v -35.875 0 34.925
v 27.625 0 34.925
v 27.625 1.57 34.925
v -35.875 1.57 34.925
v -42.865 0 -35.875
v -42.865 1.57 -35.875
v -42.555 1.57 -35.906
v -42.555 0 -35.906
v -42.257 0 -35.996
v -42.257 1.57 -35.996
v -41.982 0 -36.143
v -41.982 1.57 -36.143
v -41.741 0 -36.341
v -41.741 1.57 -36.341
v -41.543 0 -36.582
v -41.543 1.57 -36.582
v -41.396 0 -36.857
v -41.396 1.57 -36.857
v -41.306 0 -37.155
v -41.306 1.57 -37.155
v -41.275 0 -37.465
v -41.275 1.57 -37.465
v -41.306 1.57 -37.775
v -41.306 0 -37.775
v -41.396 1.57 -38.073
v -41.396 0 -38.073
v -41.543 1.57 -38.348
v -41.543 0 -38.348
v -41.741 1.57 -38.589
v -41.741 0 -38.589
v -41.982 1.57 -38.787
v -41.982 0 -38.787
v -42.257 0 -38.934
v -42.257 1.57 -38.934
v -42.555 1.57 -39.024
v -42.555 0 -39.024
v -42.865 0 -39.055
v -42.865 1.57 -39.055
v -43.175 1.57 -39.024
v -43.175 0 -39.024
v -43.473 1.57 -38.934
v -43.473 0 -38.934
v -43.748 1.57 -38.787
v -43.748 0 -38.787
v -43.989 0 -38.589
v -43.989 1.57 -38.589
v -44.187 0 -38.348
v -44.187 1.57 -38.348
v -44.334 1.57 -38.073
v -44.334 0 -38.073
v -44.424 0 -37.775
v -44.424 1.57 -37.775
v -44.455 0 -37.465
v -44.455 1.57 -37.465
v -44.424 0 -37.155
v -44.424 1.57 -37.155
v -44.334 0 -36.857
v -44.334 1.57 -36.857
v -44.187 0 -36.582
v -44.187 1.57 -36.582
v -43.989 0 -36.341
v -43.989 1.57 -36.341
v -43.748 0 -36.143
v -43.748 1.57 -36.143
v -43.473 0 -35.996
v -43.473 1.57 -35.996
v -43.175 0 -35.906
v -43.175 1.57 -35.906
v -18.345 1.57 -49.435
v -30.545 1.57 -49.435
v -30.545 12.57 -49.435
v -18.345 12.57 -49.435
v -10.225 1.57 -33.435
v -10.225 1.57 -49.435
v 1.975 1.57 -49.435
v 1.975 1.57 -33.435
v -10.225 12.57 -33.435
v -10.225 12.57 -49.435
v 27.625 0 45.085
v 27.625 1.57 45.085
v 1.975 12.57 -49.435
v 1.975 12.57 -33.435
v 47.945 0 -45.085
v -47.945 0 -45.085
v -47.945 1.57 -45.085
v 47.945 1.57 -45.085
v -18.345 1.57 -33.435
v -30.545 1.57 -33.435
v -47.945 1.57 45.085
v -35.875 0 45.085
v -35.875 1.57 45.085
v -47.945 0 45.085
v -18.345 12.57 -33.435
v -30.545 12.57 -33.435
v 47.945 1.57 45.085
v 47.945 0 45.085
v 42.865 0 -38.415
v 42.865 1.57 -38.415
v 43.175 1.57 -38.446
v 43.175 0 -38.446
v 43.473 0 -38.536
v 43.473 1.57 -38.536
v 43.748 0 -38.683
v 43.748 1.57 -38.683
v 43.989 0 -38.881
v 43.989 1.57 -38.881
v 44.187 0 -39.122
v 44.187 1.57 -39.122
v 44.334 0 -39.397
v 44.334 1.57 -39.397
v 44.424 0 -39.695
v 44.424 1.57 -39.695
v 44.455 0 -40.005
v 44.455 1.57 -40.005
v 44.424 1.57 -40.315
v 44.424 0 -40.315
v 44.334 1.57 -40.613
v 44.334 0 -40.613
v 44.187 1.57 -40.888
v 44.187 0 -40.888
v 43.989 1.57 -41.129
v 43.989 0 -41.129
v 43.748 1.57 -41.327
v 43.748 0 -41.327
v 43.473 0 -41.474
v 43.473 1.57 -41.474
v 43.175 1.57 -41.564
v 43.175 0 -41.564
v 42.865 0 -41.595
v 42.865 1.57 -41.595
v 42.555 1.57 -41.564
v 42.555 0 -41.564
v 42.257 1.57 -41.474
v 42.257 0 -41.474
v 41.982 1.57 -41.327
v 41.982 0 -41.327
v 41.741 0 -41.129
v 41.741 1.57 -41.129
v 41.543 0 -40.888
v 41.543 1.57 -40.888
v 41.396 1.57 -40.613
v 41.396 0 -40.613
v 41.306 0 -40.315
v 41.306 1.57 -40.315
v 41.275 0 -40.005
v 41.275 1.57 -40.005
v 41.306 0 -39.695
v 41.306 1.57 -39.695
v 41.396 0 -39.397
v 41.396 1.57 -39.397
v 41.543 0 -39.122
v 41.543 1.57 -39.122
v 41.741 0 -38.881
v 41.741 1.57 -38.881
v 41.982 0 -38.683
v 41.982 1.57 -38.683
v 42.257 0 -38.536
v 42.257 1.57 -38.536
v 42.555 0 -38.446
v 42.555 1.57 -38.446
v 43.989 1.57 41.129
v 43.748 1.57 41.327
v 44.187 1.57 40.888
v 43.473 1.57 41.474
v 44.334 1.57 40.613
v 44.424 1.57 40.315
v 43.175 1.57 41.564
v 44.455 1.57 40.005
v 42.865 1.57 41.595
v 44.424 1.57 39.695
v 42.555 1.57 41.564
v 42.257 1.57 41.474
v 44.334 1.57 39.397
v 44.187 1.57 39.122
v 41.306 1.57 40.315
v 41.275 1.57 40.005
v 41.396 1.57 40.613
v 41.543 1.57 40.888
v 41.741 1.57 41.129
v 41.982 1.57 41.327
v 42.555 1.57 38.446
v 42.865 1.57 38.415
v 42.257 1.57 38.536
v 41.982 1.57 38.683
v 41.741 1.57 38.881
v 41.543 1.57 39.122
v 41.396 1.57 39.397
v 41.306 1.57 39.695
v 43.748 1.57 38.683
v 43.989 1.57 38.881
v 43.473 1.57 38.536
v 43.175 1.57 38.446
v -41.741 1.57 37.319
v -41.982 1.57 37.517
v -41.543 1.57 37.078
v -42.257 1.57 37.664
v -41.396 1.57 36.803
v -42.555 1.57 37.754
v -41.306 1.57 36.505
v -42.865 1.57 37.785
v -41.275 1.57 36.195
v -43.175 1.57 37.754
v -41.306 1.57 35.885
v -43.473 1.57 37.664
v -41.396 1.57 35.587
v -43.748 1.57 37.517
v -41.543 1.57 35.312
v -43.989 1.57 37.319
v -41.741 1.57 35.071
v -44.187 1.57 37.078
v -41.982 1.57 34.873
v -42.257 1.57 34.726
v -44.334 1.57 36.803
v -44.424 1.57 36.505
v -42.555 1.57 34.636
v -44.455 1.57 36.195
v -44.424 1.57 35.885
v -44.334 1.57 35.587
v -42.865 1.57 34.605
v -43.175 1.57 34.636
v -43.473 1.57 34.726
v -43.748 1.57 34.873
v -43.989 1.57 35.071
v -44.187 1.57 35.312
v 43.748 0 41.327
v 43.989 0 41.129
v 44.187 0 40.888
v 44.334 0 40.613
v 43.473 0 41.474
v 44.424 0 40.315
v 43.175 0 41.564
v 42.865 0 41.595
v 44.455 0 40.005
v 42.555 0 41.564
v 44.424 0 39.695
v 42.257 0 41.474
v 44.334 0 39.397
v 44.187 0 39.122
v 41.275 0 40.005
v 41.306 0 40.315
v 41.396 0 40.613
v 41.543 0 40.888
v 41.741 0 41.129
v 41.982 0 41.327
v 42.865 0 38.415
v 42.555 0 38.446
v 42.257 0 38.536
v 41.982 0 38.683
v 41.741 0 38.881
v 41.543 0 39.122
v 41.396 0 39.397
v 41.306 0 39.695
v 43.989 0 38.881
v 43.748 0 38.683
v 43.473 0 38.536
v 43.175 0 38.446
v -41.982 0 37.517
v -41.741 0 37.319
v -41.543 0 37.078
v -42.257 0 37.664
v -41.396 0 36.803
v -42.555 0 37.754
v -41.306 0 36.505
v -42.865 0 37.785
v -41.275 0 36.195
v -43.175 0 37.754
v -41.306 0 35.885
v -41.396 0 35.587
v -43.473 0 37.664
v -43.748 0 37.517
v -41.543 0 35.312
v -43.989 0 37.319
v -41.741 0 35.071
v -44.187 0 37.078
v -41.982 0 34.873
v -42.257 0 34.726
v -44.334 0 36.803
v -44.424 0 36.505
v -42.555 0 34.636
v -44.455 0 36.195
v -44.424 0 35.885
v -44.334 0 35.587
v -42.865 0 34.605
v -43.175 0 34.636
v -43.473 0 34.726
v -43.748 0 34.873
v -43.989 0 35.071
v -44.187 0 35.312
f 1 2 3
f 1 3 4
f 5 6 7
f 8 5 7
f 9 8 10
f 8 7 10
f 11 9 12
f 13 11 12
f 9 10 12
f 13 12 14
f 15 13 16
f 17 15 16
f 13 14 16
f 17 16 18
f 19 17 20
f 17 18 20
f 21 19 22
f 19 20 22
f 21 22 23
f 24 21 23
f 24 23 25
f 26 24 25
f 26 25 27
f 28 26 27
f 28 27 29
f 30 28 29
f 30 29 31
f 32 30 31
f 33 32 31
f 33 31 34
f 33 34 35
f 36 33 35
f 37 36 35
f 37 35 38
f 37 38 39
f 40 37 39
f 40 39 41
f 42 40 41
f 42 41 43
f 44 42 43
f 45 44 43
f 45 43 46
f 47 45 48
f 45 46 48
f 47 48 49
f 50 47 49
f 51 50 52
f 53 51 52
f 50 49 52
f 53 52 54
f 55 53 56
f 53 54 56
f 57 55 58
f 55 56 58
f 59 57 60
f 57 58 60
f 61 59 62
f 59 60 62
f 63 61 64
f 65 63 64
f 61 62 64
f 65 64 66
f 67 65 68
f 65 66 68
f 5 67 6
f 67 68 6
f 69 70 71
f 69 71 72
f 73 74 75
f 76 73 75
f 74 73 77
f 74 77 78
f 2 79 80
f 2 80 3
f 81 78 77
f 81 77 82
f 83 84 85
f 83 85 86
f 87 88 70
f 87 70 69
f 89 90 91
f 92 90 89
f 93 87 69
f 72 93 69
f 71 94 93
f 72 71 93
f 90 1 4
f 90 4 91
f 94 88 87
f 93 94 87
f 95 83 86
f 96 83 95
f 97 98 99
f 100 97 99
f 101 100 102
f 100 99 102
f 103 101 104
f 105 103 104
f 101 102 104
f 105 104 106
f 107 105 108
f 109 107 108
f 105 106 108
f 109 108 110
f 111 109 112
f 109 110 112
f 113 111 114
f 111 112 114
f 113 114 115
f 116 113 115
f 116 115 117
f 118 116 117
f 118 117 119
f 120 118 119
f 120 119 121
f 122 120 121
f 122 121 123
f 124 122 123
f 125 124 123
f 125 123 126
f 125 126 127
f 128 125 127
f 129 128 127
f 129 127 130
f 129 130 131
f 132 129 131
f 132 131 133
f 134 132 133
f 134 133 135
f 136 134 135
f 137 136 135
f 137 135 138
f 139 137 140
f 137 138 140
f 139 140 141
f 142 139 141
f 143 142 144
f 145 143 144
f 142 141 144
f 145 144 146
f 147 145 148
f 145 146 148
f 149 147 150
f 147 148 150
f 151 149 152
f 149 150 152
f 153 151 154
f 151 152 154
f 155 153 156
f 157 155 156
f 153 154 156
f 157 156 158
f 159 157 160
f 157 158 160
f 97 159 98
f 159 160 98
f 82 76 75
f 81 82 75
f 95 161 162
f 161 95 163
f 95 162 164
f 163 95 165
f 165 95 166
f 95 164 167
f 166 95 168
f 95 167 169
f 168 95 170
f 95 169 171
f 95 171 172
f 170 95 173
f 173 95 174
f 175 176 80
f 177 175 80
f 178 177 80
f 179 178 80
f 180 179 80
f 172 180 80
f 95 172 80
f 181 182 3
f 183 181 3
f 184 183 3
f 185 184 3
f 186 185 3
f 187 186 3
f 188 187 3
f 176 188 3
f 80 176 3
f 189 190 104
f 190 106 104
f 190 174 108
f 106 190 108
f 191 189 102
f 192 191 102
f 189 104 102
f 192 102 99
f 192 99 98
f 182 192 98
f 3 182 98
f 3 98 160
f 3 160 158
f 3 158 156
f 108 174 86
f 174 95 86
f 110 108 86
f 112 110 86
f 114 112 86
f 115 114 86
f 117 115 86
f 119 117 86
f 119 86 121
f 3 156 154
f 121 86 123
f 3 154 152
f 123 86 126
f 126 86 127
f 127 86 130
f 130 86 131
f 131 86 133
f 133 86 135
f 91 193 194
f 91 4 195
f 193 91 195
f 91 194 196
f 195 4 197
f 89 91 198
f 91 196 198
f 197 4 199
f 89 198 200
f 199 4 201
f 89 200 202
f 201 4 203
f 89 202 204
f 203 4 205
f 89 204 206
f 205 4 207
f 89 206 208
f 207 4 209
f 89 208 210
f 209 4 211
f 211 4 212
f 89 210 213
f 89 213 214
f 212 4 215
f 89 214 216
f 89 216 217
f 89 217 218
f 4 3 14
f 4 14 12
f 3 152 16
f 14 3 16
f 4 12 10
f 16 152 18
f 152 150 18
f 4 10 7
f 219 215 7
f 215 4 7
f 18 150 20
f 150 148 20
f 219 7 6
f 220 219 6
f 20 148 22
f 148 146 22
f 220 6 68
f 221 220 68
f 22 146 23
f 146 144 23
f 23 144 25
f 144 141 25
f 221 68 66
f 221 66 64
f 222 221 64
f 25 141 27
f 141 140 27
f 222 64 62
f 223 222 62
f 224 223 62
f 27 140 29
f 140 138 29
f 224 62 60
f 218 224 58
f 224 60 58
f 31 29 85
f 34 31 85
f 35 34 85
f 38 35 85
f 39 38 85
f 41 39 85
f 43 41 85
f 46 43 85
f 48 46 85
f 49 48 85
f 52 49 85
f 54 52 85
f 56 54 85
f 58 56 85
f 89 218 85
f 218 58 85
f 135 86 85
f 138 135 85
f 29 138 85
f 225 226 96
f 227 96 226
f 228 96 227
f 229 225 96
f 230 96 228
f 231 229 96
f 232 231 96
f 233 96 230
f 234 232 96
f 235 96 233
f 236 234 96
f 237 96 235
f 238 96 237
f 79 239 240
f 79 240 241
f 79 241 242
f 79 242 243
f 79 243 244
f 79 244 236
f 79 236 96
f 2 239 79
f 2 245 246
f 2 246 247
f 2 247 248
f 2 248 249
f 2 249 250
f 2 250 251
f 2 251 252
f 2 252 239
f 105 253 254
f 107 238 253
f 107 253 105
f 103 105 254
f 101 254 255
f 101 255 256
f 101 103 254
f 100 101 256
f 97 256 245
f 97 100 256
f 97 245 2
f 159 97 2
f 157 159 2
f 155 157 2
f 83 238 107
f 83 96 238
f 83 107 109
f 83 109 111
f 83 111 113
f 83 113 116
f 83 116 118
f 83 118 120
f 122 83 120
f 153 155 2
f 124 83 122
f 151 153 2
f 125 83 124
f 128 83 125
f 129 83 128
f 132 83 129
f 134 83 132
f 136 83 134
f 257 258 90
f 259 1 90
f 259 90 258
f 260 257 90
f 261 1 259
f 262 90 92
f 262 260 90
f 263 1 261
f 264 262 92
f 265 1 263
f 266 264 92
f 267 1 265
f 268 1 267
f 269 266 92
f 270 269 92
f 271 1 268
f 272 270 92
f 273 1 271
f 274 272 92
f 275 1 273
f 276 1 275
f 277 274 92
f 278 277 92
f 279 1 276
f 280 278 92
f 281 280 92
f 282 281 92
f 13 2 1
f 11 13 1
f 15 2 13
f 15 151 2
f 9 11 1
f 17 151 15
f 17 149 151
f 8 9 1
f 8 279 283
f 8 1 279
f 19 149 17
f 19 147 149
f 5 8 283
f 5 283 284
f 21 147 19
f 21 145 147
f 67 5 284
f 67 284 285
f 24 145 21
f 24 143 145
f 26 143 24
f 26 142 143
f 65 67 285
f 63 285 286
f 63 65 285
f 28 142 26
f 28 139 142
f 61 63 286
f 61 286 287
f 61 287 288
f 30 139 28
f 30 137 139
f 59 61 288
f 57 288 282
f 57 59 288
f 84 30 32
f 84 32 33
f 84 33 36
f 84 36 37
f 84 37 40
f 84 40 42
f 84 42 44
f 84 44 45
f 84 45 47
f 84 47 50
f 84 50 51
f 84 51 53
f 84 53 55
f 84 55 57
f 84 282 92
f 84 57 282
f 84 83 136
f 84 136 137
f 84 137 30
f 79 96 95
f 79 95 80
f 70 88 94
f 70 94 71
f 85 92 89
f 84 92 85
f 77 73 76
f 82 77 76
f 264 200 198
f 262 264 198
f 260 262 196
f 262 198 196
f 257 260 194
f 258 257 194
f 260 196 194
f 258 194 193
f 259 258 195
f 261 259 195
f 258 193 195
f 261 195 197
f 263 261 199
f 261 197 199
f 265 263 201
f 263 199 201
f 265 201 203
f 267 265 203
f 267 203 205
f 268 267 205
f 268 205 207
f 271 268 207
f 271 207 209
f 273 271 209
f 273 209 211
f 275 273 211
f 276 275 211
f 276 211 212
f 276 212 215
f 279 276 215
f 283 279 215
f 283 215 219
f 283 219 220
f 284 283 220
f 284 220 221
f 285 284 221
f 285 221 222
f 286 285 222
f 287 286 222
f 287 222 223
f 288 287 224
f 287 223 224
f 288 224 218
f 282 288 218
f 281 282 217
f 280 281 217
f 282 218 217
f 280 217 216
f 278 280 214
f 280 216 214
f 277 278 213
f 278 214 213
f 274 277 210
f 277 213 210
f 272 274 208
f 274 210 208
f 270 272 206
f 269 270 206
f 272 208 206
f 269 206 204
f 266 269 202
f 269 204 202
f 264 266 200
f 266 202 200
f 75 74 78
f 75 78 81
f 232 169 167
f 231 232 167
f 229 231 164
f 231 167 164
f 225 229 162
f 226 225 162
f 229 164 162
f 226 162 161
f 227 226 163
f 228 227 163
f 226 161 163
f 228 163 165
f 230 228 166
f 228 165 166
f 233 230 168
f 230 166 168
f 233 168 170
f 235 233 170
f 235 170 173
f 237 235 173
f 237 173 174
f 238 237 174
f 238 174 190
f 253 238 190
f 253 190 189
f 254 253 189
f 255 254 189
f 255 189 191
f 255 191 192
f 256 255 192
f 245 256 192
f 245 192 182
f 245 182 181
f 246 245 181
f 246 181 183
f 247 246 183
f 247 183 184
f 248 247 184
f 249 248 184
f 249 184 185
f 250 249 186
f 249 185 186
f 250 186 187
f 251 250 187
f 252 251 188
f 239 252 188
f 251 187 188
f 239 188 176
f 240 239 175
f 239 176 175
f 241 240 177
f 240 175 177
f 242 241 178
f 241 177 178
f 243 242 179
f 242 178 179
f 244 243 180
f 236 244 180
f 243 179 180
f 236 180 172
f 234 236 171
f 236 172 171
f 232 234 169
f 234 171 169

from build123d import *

# Parameters (mm, degrees)
BOSS_EXTRUDE1_DEPTH   = 1.57
SKETCH2_R             = 1.59
CUT_EXTRUDE1_DEPTH    = 66.831946272
SKETCH3_W             = 12.2
SKETCH3_H             = 16
BOSS_EXTRUDE2_DEPTH   = 11
BOSS_EXTRUDE2_2_DEPTH = 11


with BuildPart() as part:
    # Sketch1 → Boss-Extrude1 (new body)
    with BuildSketch(Plane(origin=(0, 0, 0), x_dir=(1, 0, 0), z_dir=(0, 1, 0))):
        Polygon((-35.875, -45.085), (-47.945, -45.085), (-47.945, 45.085), (47.945, 45.085), (47.945, -45.085), (27.625, -45.085), (27.625, -34.925), (-35.875, -34.925), align=None)
    extrude(amount=BOSS_EXTRUDE1_DEPTH)

    # Sketch2 → Cut-Extrude1 (cut, through all)
    with BuildSketch(Plane(origin=(0, 1.57, 0), x_dir=(1, 0, 0), z_dir=(0, 1, 0))):
        with Locations(Location((42.865, -40.005, 0), (0, 0, 270))):
            Circle(SKETCH2_R)
        with Locations(Location((-42.865, -36.195, 0), (0, 0, 270))):
            Circle(SKETCH2_R)
        with Locations(Location((-42.865, 37.465, 0), (0, 0, 270))):
            Circle(SKETCH2_R)
        with Locations(Location((42.865, 40.005, 0), (0, 0, 270))):
            Circle(SKETCH2_R)
    extrude(amount=-CUT_EXTRUDE1_DEPTH, mode=Mode.SUBTRACT)


with BuildPart() as body_2:
    # Sketch3 → Boss-Extrude2 (new body)
    with BuildSketch(Plane(origin=(0, 1.57, 0), x_dir=(1, 0, 0), z_dir=(0, 1, 0))):
        with Locations((-24.445, 41.435)):
            Rectangle(SKETCH3_W, SKETCH3_H)
    extrude(amount=BOSS_EXTRUDE2_DEPTH)


with BuildPart() as body_3:
    # Sketch3 → Boss-Extrude2 2 (new body)
    with BuildSketch(Plane(origin=(0, 1.57, 0), x_dir=(1, 0, 0), z_dir=(0, 1, 0))):
        with Locations((-4.125, 41.435)):
            Rectangle(SKETCH3_W, SKETCH3_H)
    extrude(amount=BOSS_EXTRUDE2_2_DEPTH)


solid = Compound([part.part, body_2.part, body_3.part])
